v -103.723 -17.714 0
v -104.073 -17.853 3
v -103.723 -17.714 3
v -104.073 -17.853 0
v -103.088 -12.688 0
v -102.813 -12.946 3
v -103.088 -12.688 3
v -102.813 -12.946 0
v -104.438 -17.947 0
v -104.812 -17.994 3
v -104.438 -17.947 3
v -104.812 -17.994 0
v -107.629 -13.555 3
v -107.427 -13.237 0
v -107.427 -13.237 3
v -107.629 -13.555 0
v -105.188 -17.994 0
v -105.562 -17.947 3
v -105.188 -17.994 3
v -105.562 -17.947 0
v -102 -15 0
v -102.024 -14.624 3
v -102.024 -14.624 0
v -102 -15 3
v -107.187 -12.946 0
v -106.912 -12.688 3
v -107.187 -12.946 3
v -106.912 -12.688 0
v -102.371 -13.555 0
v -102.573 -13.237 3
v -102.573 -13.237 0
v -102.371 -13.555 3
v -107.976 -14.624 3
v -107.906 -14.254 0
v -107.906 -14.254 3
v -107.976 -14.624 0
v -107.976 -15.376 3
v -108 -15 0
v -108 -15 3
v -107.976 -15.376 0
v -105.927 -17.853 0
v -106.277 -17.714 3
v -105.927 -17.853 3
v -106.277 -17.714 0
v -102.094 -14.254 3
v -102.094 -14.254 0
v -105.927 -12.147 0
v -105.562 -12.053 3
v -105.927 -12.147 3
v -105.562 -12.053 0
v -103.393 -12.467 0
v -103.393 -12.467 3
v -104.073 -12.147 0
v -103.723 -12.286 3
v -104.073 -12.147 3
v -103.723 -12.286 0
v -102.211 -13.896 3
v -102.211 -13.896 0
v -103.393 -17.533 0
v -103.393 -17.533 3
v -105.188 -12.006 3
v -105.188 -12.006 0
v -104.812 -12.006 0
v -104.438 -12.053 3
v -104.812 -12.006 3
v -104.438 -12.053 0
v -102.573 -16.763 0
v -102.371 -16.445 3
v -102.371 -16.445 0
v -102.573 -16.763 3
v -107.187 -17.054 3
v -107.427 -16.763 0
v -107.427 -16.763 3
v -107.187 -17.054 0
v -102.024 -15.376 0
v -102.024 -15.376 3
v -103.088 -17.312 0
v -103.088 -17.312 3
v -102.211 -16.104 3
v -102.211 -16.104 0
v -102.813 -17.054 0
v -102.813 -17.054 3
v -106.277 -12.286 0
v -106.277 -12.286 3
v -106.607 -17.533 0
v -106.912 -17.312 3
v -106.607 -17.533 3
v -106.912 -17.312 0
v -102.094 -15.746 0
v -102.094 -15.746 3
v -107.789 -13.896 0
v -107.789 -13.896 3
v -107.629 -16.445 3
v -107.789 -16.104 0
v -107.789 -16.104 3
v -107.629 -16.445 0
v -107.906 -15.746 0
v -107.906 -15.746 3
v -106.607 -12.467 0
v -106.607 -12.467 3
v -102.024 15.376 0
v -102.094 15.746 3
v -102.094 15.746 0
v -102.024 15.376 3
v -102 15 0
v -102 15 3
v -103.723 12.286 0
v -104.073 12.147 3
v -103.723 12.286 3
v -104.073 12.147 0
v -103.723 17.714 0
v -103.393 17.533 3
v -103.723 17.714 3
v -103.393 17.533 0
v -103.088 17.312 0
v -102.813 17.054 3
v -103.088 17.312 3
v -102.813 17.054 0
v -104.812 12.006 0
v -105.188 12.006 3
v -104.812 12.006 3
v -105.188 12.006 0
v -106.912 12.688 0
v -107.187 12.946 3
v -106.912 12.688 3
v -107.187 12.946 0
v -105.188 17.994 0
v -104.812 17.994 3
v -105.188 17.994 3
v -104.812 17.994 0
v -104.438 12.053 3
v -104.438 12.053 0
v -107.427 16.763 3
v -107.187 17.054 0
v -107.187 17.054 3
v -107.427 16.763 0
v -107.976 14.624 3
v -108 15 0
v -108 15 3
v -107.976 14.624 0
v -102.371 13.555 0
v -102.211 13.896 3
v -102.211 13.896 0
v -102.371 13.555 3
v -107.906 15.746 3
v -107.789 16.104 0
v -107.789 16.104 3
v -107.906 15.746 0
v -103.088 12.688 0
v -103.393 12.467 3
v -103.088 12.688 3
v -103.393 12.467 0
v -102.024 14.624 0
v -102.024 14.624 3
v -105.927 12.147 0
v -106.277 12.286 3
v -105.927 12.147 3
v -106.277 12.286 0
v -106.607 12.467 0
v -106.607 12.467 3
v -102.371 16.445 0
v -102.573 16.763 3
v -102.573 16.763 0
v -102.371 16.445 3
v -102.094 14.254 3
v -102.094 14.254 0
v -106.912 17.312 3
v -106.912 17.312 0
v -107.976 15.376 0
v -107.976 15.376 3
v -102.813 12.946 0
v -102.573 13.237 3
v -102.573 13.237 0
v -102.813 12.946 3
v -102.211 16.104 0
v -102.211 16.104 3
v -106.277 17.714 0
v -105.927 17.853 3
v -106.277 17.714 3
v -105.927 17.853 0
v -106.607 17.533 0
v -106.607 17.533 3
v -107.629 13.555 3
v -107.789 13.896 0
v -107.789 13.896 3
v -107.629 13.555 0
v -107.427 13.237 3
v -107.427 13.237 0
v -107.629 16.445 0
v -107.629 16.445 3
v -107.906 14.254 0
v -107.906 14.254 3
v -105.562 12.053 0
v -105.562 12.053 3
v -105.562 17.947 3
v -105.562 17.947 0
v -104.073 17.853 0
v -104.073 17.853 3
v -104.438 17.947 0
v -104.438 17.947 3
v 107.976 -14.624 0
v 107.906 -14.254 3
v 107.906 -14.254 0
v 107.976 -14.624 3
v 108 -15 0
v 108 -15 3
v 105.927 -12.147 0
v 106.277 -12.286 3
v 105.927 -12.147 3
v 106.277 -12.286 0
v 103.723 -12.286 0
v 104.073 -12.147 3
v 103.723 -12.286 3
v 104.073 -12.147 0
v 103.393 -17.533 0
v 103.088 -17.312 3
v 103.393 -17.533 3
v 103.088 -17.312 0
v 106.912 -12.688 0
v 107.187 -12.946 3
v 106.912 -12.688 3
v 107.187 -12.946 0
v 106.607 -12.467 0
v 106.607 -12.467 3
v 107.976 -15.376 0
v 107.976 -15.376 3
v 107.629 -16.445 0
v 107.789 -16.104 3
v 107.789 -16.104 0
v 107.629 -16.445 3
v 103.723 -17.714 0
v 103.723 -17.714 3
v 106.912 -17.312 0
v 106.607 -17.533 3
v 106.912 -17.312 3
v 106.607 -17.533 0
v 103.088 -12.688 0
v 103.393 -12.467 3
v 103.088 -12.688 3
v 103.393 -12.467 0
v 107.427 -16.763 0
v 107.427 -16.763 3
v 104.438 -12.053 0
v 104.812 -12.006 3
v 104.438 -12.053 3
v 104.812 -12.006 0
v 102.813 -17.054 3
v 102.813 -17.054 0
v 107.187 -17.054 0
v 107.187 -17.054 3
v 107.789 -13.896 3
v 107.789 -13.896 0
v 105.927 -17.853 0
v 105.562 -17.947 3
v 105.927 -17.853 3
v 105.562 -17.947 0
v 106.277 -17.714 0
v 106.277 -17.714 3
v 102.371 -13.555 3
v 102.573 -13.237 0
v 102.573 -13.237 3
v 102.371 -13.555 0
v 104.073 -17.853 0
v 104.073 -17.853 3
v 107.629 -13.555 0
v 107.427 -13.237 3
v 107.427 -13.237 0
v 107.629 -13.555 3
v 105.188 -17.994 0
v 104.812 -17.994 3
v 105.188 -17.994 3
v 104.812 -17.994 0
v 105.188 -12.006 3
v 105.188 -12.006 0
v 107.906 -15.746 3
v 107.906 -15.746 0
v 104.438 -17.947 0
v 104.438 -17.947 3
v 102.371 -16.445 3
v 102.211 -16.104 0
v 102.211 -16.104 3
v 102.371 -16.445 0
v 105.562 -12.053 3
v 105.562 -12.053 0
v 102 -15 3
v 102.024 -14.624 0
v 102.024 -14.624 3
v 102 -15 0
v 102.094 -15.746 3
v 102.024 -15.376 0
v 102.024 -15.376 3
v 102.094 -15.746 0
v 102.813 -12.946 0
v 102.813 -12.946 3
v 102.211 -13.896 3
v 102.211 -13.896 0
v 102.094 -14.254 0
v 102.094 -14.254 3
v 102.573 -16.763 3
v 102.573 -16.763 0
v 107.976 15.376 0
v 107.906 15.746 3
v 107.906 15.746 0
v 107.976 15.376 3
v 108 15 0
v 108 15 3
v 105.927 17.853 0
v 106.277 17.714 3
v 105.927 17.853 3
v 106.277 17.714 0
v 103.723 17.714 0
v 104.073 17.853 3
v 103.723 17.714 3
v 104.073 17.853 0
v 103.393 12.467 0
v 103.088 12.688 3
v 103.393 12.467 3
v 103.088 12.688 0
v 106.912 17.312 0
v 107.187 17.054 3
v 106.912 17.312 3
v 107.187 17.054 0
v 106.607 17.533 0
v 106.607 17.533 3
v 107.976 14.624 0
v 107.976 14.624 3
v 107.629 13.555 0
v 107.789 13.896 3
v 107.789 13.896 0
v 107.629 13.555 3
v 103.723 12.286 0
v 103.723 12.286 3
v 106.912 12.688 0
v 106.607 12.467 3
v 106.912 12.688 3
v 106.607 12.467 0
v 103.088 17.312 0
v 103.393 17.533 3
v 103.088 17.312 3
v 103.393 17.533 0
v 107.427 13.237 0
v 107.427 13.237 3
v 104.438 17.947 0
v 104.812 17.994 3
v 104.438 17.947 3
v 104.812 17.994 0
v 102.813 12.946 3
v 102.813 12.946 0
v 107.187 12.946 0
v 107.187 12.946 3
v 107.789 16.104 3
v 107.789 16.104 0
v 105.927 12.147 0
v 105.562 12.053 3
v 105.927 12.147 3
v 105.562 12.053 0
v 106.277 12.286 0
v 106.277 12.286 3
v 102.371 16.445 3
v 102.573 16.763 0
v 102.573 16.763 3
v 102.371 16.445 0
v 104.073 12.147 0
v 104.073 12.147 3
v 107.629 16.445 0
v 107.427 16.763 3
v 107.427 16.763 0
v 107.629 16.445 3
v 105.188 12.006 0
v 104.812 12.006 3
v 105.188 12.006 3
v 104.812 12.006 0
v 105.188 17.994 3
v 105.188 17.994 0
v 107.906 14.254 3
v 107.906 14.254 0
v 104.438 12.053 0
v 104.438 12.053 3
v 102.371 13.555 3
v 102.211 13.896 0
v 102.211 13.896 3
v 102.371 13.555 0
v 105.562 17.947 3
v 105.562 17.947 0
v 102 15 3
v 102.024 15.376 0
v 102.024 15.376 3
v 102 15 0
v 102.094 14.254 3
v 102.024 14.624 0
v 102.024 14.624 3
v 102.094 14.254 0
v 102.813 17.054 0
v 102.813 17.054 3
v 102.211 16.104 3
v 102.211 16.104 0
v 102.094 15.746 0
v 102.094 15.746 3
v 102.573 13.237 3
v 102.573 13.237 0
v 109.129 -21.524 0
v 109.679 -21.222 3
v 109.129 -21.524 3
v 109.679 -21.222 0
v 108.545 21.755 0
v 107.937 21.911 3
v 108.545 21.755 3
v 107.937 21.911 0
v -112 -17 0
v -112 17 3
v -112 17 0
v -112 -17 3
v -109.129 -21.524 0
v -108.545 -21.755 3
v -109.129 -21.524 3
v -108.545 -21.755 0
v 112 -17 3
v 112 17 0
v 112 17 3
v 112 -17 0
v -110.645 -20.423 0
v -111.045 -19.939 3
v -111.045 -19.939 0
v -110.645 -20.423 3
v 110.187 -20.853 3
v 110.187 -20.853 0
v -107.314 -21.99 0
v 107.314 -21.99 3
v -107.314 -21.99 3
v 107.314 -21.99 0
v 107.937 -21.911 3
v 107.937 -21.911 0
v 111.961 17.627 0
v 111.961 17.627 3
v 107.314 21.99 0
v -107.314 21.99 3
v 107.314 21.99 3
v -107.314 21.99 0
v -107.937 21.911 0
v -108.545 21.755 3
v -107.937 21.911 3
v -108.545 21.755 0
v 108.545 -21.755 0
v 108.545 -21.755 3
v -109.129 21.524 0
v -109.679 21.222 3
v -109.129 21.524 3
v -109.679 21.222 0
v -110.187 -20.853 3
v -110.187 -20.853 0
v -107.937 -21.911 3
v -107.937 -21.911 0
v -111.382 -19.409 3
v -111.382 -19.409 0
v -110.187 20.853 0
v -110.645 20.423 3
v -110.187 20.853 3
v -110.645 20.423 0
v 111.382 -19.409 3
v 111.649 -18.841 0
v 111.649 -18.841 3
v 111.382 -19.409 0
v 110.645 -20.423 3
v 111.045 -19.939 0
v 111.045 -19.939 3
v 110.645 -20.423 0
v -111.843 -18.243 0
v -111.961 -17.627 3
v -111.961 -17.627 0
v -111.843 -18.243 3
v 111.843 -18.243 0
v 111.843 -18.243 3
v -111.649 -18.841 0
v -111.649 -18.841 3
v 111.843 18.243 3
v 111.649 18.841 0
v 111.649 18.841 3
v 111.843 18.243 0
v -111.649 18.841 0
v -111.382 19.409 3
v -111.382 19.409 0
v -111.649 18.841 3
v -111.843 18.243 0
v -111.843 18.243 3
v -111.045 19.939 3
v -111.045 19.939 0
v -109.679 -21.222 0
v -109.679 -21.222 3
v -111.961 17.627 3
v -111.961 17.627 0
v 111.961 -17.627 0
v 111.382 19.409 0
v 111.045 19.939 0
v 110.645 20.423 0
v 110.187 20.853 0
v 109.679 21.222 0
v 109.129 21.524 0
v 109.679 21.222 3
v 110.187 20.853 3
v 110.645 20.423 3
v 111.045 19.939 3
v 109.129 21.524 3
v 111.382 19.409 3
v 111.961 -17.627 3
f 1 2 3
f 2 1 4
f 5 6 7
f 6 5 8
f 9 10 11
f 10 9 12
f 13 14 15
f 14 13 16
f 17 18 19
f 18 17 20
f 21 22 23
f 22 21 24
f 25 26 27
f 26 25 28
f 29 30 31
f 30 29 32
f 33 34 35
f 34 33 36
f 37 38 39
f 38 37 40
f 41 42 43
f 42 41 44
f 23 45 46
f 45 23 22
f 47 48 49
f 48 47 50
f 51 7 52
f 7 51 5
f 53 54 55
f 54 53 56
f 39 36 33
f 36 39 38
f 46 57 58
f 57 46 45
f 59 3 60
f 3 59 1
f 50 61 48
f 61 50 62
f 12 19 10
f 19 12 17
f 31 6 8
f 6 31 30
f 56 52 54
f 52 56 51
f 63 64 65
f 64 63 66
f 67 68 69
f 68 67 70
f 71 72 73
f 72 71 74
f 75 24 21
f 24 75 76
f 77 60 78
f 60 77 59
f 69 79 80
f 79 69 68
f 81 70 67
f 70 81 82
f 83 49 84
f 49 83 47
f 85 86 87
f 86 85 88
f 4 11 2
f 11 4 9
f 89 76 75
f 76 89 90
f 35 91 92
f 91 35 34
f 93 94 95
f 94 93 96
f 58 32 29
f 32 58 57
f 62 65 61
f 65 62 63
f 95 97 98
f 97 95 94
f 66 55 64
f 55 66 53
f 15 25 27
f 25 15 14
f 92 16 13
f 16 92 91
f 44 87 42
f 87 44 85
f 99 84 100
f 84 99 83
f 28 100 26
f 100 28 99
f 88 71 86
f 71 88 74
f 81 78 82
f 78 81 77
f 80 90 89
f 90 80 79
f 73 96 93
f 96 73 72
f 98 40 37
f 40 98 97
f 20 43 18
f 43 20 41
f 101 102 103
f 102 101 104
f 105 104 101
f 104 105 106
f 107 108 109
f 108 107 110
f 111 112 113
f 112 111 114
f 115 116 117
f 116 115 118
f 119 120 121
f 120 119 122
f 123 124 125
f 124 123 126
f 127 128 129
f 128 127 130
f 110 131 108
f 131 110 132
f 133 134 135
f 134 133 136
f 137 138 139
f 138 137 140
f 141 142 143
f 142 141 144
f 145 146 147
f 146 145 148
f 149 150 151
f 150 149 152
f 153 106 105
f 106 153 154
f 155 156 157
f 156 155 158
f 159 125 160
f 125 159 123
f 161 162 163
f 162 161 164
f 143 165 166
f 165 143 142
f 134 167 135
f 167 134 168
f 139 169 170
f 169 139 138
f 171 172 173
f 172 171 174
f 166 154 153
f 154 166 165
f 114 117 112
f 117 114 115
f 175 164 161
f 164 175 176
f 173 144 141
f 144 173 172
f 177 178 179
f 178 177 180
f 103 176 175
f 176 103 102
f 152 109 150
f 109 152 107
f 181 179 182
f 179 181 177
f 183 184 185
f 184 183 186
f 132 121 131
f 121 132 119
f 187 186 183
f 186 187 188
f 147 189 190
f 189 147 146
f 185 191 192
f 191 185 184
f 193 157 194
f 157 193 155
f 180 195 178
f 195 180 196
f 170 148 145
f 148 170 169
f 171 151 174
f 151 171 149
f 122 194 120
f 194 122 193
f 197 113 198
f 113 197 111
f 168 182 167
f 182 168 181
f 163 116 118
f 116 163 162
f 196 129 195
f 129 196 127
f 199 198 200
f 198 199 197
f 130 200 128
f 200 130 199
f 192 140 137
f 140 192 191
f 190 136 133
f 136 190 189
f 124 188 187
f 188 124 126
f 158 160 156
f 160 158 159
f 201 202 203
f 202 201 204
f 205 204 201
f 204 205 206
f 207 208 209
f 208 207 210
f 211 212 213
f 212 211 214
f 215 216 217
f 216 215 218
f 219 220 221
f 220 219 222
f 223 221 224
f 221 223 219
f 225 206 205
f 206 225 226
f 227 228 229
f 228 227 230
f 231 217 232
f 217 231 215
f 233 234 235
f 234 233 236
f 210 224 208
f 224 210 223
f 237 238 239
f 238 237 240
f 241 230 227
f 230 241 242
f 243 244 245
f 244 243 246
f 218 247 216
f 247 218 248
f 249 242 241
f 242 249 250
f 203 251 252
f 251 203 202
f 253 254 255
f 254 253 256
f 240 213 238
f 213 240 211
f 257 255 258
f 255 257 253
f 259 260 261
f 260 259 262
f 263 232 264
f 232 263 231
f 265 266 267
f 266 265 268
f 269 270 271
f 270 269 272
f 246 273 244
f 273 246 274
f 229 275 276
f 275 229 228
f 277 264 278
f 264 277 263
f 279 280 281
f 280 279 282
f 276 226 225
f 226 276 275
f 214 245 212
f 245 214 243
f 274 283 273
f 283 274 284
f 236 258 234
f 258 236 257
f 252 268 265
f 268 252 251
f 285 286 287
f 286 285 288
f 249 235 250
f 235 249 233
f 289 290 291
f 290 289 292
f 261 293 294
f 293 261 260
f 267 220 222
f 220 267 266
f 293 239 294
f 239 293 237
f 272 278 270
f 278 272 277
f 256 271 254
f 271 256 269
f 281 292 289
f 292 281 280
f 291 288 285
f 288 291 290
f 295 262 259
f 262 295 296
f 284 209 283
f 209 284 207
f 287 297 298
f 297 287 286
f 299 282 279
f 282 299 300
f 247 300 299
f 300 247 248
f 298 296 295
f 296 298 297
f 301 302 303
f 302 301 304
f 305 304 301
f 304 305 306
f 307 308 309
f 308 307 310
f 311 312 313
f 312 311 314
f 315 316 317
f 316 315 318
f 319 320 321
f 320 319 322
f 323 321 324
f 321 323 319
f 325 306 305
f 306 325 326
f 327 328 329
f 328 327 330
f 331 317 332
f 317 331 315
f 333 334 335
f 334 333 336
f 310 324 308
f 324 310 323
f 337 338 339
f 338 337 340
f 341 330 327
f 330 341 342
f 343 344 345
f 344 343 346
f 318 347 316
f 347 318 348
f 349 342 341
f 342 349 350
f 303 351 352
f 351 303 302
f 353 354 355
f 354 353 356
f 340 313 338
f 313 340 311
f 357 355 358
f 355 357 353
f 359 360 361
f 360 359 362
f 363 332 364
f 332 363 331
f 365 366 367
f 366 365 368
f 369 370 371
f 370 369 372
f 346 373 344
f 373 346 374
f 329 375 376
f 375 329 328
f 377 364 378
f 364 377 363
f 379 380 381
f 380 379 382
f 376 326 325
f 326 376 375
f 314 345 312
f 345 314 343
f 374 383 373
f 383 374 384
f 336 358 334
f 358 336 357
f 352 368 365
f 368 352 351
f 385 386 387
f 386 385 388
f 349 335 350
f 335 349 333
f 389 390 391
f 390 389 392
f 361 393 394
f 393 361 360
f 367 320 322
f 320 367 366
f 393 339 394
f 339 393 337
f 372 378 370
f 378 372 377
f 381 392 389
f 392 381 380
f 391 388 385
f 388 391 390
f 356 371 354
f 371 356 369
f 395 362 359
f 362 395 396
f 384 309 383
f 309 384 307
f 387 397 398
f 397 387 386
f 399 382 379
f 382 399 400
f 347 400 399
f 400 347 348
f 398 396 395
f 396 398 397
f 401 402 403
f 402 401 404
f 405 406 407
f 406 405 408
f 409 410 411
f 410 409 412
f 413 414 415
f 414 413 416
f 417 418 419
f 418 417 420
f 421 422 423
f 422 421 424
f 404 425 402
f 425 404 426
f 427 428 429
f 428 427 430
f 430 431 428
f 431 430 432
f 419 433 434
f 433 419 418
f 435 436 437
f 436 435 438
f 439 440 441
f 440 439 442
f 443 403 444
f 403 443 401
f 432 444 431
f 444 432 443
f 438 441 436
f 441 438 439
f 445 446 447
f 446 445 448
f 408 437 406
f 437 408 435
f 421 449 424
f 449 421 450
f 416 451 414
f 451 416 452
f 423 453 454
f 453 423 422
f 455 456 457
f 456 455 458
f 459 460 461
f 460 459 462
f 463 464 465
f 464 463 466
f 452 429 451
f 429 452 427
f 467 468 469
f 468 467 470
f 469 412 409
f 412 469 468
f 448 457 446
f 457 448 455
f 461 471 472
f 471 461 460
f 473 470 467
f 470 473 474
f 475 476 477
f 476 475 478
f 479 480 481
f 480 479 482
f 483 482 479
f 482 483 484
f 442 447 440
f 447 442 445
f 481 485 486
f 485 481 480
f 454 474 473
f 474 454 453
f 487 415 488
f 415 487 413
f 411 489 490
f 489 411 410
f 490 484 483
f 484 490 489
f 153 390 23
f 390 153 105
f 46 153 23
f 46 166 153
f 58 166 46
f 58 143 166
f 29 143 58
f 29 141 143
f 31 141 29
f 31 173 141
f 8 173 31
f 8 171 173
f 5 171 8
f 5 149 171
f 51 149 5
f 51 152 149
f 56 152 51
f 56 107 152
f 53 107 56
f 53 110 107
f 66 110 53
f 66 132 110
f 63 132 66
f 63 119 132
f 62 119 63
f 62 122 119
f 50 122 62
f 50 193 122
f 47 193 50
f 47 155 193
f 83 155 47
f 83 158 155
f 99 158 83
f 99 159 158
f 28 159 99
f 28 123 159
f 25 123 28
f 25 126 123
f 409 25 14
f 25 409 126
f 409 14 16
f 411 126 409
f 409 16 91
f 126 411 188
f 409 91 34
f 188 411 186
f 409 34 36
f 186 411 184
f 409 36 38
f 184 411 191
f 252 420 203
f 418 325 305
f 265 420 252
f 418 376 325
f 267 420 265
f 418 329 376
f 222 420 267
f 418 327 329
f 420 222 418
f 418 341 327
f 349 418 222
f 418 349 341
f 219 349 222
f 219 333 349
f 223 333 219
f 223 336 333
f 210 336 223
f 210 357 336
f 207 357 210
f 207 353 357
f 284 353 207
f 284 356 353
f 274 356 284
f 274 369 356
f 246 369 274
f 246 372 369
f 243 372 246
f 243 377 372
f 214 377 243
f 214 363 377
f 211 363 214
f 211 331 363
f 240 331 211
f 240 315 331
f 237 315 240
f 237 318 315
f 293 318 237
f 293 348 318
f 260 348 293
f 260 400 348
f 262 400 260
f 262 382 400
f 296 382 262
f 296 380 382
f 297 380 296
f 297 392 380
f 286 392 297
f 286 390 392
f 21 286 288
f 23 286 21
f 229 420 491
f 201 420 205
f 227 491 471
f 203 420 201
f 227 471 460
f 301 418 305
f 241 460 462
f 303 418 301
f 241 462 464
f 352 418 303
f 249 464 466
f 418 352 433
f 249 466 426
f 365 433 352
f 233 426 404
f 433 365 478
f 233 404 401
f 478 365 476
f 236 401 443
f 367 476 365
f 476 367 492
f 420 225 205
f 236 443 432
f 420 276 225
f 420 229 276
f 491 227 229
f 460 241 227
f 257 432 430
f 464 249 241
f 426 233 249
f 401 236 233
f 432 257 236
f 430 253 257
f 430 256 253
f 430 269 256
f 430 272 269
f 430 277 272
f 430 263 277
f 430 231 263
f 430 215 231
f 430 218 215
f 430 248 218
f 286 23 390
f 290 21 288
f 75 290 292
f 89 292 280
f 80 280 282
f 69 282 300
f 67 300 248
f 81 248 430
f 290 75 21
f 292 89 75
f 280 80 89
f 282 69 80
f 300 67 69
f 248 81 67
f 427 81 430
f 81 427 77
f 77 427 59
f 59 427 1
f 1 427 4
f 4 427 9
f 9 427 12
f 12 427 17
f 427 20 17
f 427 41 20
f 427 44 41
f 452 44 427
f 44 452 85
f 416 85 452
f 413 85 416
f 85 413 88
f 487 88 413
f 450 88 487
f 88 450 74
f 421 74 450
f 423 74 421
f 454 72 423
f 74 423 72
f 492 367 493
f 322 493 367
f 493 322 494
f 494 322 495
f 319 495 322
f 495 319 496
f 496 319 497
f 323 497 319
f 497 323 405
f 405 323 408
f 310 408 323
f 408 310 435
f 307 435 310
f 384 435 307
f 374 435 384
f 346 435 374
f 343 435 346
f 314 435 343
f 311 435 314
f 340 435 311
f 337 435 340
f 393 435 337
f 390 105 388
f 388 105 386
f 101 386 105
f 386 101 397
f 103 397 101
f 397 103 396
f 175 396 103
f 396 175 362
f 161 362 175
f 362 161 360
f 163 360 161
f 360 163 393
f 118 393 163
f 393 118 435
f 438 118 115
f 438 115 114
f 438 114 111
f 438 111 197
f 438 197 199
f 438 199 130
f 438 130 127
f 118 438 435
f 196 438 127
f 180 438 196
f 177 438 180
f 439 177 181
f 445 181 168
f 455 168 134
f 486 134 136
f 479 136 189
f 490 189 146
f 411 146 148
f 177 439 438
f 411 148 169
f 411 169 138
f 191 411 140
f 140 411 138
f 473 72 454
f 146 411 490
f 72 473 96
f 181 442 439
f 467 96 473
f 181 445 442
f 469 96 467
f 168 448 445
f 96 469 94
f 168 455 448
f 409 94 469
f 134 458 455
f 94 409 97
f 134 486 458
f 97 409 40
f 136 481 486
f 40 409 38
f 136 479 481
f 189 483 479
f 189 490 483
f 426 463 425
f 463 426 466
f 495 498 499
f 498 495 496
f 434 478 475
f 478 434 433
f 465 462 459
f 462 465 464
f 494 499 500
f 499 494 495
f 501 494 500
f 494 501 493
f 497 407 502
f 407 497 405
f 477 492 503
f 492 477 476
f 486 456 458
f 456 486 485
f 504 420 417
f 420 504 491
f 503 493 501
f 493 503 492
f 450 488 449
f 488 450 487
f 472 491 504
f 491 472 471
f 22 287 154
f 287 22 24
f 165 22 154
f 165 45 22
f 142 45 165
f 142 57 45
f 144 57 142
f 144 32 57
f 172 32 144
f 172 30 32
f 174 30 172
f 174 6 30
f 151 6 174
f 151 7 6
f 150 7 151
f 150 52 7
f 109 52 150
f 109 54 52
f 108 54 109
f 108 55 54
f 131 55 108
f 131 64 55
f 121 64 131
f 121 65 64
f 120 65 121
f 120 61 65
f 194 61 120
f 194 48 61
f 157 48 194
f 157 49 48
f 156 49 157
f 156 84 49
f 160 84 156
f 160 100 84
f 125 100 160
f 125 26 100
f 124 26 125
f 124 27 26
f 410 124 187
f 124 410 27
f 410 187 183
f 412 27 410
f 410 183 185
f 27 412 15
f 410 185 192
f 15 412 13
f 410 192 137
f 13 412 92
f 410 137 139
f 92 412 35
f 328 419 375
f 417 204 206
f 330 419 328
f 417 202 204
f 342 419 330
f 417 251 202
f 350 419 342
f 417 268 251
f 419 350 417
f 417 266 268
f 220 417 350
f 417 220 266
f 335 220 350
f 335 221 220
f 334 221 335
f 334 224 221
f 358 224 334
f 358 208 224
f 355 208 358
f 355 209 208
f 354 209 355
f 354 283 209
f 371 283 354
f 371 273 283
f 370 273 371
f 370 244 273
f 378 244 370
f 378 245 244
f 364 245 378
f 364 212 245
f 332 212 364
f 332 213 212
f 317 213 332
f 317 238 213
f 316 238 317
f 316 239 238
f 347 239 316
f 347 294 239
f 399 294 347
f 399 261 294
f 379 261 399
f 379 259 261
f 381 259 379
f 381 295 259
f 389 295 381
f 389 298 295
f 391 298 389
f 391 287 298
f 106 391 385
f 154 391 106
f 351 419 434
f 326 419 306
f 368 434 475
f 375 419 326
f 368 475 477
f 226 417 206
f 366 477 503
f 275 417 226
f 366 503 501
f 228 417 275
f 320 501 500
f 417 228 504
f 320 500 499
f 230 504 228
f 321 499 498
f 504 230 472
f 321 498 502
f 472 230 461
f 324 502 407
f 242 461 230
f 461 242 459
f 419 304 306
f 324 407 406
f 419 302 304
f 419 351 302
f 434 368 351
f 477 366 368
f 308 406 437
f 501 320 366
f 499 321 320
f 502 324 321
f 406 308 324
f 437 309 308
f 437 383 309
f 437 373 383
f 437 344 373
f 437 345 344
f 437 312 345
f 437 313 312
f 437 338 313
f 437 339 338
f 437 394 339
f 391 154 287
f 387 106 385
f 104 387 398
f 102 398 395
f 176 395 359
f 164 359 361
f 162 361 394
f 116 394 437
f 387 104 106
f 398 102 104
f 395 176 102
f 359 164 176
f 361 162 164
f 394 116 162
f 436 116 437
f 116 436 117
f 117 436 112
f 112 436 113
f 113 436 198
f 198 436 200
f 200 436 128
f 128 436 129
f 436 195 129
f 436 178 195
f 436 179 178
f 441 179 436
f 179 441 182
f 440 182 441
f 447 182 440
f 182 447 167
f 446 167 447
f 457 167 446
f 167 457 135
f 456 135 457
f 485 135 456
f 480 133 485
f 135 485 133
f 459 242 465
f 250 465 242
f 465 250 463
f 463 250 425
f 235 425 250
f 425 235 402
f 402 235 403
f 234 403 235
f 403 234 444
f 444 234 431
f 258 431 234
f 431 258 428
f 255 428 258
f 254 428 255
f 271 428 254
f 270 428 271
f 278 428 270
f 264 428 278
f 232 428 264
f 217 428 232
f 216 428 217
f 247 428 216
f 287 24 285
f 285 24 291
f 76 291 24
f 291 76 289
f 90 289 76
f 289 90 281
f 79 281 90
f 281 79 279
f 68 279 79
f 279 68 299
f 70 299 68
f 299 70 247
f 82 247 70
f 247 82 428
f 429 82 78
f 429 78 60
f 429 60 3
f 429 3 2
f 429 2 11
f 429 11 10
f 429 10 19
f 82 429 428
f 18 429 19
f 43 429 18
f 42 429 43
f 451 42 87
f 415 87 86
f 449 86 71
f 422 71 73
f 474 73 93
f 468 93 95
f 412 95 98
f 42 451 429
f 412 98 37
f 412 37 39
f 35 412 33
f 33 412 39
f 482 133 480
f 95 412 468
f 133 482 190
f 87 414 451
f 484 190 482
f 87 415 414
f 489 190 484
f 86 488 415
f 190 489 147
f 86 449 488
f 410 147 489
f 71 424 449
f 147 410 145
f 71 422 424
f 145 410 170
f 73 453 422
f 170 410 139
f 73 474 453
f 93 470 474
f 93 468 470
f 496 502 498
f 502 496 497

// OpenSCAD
$fn = 50;


difference() {
	union() {
		hull() {
			translate(v = [-107.0000000000, 17.0000000000, 0]) {
				cylinder(h = 3, r = 5);
			}
			translate(v = [107.0000000000, 17.0000000000, 0]) {
				cylinder(h = 3, r = 5);
			}
			translate(v = [-107.0000000000, -17.0000000000, 0]) {
				cylinder(h = 3, r = 5);
			}
			translate(v = [107.0000000000, -17.0000000000, 0]) {
				cylinder(h = 3, r = 5);
			}
		}
	}
	union() {
		translate(v = [-105.0000000000, -15.0000000000, -100.0000000000]) {
			cylinder(h = 200, r = 3.0000000000);
		}
		translate(v = [-105.0000000000, 15.0000000000, -100.0000000000]) {
			cylinder(h = 200, r = 3.0000000000);
		}
		translate(v = [105.0000000000, -15.0000000000, -100.0000000000]) {
			cylinder(h = 200, r = 3.0000000000);
		}
		translate(v = [105.0000000000, 15.0000000000, -100.0000000000]) {
			cylinder(h = 200, r = 3.0000000000);
		}
	}
}
